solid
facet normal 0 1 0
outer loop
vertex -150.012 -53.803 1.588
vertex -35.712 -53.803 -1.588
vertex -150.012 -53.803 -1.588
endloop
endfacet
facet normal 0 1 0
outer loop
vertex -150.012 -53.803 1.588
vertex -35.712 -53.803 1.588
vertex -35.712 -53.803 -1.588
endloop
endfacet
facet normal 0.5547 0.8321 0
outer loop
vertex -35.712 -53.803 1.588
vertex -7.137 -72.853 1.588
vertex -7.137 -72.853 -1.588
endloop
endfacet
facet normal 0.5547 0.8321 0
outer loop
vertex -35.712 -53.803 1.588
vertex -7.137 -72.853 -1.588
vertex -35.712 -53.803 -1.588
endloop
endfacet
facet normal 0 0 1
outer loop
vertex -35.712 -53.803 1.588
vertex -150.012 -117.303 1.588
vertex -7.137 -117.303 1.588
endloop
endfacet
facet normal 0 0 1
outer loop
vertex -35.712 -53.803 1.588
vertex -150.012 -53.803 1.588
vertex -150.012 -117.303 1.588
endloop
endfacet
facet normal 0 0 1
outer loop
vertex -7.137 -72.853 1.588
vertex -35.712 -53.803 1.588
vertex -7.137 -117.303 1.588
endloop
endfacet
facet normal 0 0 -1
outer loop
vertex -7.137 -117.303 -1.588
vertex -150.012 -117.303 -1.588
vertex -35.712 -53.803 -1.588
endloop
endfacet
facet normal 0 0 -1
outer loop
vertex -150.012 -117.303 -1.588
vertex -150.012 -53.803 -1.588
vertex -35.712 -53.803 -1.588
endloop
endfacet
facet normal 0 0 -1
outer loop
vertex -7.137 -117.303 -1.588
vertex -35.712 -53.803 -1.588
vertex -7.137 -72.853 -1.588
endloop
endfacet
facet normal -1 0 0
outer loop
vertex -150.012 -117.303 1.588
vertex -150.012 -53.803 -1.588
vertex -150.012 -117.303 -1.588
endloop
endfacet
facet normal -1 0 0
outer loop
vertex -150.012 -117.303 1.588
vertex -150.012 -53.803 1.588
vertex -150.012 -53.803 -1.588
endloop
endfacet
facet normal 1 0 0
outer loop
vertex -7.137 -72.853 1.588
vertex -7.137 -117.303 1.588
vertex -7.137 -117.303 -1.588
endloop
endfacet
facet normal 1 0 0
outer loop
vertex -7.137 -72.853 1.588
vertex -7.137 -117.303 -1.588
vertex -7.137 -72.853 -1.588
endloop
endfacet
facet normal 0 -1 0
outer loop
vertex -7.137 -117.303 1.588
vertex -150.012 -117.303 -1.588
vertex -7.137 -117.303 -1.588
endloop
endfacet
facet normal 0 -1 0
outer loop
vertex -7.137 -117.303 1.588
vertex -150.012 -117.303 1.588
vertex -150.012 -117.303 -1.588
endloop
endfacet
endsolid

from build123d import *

# Parameters (mm, degrees)
BOSS_EXTRUDE1_DEPTH = 1.5875


with BuildPart() as part:
    # Sketch1 → Boss-Extrude1 (new body, symmetric)
    with BuildSketch(Plane.XY):
        Polygon((-150.011928505, -117.303446964), (-7.136928505, -117.303446964), (-7.136928505, -72.853446964), (-35.711928505, -53.803446964), (-150.011928505, -53.803446964), align=None)
    extrude(amount=BOSS_EXTRUDE1_DEPTH, both=True)


solid = part.part
